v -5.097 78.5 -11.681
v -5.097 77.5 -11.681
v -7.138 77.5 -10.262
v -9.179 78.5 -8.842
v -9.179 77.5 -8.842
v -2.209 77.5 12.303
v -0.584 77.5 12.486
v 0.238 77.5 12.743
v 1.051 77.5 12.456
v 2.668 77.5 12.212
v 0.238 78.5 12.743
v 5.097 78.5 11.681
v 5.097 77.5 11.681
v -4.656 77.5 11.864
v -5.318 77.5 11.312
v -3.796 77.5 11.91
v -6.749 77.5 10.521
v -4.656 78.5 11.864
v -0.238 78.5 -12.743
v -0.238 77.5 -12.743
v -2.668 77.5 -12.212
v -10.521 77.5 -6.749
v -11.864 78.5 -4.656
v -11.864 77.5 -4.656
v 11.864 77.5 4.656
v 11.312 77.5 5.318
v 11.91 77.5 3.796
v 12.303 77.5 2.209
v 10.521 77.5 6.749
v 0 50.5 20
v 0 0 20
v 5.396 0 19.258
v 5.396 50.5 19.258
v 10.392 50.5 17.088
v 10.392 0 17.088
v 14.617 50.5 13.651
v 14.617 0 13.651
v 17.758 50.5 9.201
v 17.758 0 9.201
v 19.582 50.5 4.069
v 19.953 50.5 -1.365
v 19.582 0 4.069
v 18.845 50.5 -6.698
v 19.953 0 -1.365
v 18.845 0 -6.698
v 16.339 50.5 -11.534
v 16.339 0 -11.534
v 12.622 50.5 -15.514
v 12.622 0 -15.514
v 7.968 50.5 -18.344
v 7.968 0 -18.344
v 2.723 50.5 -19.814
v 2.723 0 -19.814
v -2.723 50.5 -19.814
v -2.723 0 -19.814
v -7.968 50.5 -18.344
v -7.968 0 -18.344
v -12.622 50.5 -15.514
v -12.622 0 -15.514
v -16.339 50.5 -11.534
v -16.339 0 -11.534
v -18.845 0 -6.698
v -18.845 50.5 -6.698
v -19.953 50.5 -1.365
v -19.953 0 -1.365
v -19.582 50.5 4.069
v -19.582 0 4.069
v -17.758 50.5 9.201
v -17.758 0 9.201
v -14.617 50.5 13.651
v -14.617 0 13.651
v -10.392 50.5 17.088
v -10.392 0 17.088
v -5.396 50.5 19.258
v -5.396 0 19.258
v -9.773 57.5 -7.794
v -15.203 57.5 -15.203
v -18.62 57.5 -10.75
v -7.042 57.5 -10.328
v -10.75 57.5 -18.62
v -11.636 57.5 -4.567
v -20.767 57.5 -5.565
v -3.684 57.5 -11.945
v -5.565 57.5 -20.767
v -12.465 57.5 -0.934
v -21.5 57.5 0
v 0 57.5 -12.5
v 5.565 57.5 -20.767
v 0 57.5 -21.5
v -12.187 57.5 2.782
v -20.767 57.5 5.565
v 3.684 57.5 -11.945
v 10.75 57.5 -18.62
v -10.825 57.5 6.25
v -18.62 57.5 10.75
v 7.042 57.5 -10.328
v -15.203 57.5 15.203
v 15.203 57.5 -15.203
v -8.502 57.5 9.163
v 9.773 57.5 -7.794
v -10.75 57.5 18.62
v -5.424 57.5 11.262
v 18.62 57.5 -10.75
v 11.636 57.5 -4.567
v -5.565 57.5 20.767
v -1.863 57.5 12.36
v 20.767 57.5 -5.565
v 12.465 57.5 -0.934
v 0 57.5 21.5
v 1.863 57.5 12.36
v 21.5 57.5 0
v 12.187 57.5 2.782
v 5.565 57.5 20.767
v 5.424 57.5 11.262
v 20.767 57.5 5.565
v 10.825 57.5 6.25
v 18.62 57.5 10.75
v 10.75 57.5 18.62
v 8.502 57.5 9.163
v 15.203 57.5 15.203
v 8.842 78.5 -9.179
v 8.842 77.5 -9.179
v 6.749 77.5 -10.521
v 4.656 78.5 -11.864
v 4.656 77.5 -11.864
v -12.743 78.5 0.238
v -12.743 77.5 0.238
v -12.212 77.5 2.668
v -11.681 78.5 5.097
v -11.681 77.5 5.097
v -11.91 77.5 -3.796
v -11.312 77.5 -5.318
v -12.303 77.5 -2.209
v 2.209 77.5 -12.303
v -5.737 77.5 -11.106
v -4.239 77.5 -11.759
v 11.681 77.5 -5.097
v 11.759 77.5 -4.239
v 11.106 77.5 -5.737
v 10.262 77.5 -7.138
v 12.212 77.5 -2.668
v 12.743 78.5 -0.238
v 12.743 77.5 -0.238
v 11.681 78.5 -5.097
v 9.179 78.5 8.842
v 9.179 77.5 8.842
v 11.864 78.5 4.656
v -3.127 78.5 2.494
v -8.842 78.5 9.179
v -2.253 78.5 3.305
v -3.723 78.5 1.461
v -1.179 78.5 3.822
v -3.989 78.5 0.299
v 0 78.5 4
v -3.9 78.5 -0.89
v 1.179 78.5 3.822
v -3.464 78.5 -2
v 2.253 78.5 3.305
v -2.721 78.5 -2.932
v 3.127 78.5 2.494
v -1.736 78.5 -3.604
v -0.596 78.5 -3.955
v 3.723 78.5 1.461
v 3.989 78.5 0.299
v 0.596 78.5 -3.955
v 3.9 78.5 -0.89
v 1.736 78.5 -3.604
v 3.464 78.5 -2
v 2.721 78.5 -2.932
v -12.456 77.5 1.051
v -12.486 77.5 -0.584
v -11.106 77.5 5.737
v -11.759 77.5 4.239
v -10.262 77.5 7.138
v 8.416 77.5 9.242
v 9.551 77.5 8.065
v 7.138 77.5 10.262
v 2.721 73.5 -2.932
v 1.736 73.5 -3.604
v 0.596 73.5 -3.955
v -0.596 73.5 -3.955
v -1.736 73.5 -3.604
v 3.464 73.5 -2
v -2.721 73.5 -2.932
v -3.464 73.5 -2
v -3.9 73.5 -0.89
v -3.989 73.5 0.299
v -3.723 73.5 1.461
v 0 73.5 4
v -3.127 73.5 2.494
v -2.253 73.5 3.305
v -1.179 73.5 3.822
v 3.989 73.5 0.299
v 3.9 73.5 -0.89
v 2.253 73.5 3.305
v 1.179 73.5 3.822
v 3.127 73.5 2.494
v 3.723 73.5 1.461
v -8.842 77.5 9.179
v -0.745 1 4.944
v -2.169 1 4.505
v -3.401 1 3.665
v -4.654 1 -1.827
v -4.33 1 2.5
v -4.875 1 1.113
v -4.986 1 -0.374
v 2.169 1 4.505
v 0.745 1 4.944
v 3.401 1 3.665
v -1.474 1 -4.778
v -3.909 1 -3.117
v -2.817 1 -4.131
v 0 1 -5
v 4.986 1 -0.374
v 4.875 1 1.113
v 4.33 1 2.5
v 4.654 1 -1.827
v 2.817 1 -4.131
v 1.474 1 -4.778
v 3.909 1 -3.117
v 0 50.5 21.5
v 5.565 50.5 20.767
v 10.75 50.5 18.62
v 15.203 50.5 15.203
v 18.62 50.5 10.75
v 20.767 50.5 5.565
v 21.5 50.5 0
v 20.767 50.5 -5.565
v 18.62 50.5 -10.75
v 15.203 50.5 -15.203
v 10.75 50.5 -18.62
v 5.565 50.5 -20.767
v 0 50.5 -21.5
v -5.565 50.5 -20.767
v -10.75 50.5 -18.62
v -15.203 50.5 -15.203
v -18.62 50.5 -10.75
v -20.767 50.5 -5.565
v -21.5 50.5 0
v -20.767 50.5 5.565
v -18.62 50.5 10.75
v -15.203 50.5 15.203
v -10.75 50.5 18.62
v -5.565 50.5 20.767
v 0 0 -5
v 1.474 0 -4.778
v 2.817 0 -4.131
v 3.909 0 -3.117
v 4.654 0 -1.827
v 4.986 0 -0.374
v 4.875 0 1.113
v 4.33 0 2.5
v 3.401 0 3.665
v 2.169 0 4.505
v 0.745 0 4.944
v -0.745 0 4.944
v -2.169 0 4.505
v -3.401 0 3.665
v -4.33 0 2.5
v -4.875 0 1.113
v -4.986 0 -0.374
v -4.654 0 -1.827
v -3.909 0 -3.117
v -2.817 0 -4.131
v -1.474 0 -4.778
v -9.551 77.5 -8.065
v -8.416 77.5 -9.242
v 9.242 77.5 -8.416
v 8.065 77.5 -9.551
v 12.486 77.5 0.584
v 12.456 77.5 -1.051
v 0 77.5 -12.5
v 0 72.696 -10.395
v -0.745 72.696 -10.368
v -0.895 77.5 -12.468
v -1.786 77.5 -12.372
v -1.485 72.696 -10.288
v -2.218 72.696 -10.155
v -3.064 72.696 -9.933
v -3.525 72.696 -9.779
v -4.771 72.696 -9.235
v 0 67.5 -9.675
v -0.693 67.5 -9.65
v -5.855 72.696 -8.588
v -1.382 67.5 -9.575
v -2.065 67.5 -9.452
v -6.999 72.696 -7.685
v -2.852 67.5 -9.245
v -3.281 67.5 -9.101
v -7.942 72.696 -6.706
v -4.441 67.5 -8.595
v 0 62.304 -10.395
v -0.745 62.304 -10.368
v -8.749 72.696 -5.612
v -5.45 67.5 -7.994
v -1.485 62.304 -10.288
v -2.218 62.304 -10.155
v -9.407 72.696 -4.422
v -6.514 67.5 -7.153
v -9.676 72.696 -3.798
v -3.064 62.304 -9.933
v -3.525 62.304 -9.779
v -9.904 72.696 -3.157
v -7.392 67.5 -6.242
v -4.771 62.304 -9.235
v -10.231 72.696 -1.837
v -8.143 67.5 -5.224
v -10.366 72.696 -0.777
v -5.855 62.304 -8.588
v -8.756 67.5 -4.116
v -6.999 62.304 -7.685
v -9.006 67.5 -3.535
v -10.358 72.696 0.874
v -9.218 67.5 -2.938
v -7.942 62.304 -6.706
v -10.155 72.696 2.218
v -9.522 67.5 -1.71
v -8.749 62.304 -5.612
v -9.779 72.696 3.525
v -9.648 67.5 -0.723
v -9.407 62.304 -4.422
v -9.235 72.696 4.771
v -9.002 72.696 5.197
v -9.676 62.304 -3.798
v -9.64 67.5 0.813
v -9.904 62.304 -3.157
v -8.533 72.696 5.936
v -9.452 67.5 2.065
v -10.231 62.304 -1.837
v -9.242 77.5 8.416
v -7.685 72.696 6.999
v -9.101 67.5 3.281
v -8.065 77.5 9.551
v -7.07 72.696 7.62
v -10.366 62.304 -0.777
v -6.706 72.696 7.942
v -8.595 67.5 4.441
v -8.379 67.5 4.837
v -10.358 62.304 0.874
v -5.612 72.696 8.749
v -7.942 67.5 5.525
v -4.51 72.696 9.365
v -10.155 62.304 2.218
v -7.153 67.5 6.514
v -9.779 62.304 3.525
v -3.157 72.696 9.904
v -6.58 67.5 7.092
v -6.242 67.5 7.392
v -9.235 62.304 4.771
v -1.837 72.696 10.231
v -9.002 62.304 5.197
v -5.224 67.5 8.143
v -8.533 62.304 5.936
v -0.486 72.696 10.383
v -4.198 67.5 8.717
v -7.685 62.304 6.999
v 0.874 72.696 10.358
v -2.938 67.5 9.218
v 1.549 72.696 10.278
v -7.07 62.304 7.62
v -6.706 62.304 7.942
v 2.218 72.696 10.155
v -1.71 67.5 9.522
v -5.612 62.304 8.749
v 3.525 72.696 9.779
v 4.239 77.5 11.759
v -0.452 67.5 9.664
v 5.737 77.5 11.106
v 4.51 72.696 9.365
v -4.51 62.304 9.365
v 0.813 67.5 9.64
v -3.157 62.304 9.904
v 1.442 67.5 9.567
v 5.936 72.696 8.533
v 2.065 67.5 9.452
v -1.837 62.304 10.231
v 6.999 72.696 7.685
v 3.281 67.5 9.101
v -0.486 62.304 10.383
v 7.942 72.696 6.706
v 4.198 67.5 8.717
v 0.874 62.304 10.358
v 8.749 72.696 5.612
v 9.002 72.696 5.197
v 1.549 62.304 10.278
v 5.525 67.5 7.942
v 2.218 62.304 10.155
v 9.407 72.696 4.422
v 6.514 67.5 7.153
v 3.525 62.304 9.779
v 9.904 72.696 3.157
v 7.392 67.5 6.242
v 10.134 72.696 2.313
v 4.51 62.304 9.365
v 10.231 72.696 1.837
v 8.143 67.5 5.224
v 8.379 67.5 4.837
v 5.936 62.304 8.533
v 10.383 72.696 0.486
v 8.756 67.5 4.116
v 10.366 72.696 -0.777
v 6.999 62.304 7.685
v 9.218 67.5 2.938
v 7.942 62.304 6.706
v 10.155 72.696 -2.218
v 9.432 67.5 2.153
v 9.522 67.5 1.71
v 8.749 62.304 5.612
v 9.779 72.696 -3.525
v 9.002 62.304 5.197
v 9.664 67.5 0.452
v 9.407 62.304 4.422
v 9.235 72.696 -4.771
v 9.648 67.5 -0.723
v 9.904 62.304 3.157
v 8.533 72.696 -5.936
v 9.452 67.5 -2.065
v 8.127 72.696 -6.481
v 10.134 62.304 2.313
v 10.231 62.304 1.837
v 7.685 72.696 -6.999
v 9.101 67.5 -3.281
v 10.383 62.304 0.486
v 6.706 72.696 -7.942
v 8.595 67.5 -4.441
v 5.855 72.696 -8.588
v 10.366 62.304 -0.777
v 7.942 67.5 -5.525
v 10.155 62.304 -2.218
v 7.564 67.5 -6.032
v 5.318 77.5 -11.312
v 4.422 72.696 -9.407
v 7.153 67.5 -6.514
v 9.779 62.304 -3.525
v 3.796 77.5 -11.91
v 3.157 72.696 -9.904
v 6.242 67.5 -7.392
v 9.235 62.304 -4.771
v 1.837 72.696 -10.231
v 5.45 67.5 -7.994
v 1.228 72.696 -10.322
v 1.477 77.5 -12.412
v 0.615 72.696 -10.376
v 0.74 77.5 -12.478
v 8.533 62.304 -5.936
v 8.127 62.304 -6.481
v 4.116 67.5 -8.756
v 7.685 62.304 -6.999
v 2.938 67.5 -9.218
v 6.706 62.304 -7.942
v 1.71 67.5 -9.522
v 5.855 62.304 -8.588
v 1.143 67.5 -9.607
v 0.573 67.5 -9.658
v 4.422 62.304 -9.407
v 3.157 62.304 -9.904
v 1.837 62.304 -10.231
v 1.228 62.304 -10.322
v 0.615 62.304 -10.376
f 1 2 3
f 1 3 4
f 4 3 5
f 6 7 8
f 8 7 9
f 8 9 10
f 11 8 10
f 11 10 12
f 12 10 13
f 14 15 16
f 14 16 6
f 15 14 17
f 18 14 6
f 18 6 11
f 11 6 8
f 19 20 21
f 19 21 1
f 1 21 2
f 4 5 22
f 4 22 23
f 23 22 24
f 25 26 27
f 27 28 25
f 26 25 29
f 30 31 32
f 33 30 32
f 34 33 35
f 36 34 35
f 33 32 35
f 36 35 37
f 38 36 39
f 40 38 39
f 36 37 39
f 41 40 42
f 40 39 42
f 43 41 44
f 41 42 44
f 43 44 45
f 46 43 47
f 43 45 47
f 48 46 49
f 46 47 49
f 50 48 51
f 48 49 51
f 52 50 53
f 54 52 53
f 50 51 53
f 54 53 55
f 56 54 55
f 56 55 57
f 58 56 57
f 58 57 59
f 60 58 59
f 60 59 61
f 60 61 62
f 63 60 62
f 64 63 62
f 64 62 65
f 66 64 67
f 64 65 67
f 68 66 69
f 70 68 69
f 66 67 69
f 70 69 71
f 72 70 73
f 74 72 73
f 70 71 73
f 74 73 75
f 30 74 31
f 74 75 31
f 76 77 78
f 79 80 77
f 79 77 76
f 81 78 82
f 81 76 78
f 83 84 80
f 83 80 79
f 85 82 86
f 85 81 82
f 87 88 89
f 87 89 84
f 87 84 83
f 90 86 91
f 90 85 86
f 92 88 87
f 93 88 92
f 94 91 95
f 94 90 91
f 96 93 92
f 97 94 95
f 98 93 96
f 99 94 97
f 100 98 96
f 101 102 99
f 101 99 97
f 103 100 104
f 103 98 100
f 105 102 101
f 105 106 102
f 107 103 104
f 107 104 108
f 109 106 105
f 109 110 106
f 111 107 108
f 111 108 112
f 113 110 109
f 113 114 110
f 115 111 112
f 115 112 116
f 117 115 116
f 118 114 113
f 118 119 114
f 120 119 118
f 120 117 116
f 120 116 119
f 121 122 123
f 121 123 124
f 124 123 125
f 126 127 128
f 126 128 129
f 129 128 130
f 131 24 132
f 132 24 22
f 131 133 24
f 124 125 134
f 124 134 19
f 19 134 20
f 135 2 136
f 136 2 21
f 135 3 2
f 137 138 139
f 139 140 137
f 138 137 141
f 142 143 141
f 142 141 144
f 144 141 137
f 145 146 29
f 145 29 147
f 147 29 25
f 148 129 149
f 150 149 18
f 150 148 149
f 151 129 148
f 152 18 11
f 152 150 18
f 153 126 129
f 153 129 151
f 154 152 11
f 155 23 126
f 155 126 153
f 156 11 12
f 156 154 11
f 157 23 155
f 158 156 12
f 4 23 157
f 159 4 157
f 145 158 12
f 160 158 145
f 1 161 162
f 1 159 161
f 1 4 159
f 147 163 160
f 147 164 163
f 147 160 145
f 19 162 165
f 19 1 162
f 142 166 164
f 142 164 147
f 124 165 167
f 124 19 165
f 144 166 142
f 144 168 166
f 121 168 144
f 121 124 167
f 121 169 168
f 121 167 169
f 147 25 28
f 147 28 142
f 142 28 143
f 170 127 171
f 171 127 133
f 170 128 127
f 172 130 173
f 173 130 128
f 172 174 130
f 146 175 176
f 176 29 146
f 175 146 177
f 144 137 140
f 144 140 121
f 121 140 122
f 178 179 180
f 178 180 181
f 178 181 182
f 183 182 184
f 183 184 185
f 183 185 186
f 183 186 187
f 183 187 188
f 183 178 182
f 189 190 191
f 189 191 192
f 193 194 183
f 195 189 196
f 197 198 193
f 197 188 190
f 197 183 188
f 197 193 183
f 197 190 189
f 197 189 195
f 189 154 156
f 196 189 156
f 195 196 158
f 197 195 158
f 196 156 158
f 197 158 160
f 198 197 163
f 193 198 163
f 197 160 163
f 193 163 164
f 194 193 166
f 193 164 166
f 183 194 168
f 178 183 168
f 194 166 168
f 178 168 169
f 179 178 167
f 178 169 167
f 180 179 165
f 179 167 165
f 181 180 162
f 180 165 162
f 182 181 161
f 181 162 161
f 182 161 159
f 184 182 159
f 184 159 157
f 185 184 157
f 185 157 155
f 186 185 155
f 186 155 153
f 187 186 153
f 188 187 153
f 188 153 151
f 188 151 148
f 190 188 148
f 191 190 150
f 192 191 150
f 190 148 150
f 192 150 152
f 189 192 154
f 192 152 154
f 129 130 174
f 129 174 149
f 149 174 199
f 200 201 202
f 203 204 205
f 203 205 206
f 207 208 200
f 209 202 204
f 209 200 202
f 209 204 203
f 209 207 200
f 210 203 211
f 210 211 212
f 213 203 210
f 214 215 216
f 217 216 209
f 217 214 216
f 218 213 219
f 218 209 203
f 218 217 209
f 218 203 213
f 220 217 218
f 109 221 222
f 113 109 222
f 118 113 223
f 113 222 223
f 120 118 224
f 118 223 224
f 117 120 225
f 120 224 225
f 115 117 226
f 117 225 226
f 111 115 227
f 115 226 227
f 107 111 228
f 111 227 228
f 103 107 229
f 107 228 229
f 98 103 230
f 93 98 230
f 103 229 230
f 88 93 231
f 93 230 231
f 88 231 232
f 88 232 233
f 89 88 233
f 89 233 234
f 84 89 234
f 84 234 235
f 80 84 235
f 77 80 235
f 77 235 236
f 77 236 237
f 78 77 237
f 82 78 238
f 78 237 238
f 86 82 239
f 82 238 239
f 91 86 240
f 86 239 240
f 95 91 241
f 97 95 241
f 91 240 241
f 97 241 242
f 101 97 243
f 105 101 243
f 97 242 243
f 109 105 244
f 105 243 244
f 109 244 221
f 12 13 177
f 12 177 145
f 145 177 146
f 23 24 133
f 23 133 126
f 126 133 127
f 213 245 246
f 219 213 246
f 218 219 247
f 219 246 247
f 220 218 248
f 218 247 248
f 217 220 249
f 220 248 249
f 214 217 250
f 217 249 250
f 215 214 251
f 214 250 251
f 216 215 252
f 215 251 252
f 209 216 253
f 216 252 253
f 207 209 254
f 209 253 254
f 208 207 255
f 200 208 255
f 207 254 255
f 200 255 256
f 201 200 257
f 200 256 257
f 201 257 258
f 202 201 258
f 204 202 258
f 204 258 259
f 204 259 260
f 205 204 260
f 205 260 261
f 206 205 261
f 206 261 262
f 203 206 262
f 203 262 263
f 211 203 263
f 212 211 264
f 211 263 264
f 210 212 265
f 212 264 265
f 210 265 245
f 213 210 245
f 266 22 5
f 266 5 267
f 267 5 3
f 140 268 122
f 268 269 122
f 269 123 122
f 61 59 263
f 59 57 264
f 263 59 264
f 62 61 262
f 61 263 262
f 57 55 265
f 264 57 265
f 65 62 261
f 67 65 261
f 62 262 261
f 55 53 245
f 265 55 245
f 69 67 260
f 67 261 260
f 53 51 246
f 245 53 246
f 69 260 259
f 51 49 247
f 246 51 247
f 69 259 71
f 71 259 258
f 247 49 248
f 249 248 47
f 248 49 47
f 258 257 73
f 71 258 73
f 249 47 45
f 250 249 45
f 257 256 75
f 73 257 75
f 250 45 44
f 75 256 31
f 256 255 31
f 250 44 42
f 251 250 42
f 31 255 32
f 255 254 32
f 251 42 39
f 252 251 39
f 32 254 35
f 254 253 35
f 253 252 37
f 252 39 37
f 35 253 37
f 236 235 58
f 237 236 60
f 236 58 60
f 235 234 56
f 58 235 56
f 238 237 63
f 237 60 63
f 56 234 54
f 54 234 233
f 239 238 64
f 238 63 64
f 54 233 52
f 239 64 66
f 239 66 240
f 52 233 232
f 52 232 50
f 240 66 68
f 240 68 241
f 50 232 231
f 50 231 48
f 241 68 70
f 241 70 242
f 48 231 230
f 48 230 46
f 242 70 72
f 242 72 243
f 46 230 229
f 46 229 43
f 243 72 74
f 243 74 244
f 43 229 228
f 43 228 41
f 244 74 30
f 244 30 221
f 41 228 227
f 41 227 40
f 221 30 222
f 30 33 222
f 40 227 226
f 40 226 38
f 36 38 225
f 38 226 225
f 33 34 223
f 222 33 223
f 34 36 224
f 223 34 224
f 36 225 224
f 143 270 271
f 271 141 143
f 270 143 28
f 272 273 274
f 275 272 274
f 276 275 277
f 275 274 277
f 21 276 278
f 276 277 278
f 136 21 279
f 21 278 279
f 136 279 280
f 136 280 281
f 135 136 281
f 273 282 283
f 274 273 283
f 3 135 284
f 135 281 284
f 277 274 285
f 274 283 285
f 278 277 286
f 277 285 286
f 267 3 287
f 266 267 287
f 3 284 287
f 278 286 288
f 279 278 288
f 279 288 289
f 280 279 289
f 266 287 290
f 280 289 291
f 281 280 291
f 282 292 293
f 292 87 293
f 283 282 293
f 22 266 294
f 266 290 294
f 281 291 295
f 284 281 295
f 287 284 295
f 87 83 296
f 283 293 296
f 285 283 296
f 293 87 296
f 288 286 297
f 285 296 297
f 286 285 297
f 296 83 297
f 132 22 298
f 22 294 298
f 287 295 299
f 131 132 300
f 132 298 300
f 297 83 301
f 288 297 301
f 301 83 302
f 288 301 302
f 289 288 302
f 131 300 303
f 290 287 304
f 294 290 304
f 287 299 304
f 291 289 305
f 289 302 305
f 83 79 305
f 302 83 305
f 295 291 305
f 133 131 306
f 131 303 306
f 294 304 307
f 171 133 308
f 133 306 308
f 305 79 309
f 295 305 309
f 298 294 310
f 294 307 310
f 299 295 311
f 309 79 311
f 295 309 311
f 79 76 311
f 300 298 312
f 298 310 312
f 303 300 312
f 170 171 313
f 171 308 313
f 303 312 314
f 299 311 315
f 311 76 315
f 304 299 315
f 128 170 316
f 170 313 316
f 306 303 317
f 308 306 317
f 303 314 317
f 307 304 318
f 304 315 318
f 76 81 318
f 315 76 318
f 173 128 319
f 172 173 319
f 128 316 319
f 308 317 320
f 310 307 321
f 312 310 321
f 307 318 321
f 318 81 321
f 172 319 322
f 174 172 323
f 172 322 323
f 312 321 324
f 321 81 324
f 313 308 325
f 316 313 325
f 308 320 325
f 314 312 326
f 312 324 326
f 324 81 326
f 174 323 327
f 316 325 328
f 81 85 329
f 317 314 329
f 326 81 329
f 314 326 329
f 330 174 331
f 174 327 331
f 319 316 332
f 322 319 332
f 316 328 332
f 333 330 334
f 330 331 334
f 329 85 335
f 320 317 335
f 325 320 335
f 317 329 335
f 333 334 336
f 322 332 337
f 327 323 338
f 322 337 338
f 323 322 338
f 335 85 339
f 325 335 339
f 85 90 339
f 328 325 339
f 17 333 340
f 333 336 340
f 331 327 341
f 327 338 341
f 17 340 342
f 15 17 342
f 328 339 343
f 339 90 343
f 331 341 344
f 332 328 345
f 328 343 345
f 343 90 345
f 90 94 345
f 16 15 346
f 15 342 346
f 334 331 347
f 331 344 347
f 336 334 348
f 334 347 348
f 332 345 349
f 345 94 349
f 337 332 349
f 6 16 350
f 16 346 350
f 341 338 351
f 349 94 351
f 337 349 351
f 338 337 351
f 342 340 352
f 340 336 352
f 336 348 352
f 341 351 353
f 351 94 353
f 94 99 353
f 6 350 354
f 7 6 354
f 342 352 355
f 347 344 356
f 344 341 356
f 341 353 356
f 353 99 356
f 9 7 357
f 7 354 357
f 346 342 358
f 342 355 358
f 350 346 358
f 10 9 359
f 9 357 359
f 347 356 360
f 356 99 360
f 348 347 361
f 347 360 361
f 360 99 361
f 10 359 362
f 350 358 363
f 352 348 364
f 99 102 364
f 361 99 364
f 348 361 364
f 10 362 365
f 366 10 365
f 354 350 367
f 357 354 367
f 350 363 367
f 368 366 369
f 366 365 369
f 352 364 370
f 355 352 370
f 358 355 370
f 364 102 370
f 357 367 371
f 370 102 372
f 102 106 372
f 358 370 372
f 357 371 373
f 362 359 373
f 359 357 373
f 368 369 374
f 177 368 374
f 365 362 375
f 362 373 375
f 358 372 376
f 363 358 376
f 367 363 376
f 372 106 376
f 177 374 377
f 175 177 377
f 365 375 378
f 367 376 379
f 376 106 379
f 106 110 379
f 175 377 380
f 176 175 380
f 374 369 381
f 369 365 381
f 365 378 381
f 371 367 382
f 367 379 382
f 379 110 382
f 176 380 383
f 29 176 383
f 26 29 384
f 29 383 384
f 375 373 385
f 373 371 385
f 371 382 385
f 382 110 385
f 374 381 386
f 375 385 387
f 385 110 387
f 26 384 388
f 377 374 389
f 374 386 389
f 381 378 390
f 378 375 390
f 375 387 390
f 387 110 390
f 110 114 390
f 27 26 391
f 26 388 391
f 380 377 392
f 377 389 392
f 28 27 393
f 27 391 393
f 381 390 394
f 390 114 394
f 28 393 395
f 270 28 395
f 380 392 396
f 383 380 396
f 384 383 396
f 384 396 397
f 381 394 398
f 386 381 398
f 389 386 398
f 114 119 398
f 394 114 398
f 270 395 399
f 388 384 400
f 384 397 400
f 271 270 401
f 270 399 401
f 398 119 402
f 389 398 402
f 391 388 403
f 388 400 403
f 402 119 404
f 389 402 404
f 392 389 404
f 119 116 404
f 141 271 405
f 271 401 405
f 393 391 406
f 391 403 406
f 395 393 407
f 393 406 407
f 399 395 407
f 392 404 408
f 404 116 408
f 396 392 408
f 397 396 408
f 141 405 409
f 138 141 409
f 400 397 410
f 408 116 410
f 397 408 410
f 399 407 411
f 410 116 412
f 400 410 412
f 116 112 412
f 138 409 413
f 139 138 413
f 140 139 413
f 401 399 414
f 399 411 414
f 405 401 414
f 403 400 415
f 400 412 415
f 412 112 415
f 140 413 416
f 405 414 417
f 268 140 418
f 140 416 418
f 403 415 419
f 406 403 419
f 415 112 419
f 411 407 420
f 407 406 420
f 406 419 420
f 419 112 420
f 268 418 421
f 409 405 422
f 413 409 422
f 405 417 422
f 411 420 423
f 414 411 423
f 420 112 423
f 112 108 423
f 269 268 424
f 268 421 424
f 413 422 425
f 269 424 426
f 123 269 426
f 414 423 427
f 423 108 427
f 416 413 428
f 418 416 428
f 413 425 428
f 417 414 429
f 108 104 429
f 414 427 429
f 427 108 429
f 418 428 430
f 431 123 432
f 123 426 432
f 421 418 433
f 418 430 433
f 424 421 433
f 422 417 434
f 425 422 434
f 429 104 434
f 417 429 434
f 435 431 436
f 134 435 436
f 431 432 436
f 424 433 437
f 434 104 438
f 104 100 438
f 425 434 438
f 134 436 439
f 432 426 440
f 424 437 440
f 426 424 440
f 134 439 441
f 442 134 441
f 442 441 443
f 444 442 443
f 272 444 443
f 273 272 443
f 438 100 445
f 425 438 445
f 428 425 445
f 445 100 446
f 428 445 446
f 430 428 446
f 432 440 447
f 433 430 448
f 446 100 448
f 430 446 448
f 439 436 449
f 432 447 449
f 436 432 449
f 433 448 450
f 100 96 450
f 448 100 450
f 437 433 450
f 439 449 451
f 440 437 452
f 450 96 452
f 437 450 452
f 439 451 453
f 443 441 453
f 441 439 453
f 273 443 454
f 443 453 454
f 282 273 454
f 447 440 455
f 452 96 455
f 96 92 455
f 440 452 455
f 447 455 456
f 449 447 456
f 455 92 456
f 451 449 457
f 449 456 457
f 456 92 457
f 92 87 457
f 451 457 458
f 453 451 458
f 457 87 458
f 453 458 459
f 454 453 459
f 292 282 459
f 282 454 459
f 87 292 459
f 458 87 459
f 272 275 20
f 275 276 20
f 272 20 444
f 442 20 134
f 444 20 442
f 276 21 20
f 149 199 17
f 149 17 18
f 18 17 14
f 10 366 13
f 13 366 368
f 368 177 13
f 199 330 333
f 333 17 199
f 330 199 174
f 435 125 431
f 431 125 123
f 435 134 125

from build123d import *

# Parameters (mm, degrees)
SKETCH1_R           = 20
BOSS_EXTRUDE1_DEPTH = 50.5
SKETCH2_R           = 21.5
BOSS_EXTRUDE2_DEPTH = 7
BOSS_EXTRUDE3_DEPTH = 1
SKETCH5_R           = 5
CUT_EXTRUDE1_DEPTH  = 1
SKETCH6_R           = 4
CUT_EXTRUDE2_DEPTH  = 5


with BuildPart() as part:
    # Sketch1 → Boss-Extrude1 (new body)
    with BuildSketch(Plane(origin=(0, 0, 0), x_dir=(1, 0, 0), z_dir=(0, 1, 0))):
        with Locations(Location((0, 0, 0), (0, 0, 270))):
            Circle(SKETCH1_R)
    extrude(amount=BOSS_EXTRUDE1_DEPTH)

    # Sketch2 → Boss-Extrude2 (add)
    with BuildSketch(Plane(origin=(0, 50.5, 0), x_dir=(1, 0, 0), z_dir=(0, 1, 0))):
        with Locations(Location((0, 0, 0), (0, 0, 270))):
            Circle(SKETCH2_R)
    extrude(amount=BOSS_EXTRUDE2_DEPTH)

    # Sketch3 → Revolve1 (revolve)
    with BuildSketch(Plane.XY, mode=Mode.PRIVATE) as revolve1_sk:
        with BuildLine():
            Line((0, 77.5), (12.5, 77.5))
            ThreePointArc((12.5, 77.5), (9.674701278, 67.5), (12.5, 57.5))
            Line((12.5, 57.5), (0, 57.5))
            Line((0, 57.5), (0, 77.5))
        make_face()
    revolve(revolve1_sk.sketch.rotate(Axis((0, 57.5, 0), (0, 1, 0)), 90), axis=Axis((0, 57.5, 0), (0, 1, 0)))

    # Sketch4 → Boss-Extrude3 (add)
    with BuildSketch(Plane(origin=(0, 77.5, 0), x_dir=(1, 0, 0), z_dir=(0, 1, 0))):
        Polygon((8.841834545, 9.179007009), (4.656136058, 11.863920297), (-0.238416936, 12.742659266), (-5.096673112, 11.681443874), (-9.179007009, 8.841834545), (-11.863920297, 4.656136058), (-12.742659266, -0.238416936), (-11.681443874, -5.096673112), (-8.841834545, -9.179007009), (-4.656136058, -11.863920297), (0.238416936, -12.742659266), (5.096673112, -11.681443874), (9.179007009, -8.841834545), (11.863920297, -4.656136058), (12.742659266, 0.238416936), (11.681443874, 5.096673112), align=None)
    extrude(amount=BOSS_EXTRUDE3_DEPTH)

    # Sketch5 → Cut-Extrude1 (cut)
    with BuildSketch(Plane.XZ):
        with Locations(Location((0, 0, 0), (0, 0, 270))):
            Circle(SKETCH5_R)
    extrude(amount=-CUT_EXTRUDE1_DEPTH, mode=Mode.SUBTRACT)

    # Sketch6 → Cut-Extrude2 (cut)
    with BuildSketch(Plane(origin=(0, 78.5, 0), x_dir=(1, 0, 0), z_dir=(0, 1, 0))):
        with Locations(Location((0, 0, 0), (0, 0, 270))):
            Circle(SKETCH6_R)
    extrude(amount=-CUT_EXTRUDE2_DEPTH, mode=Mode.SUBTRACT)


solid = part.part
